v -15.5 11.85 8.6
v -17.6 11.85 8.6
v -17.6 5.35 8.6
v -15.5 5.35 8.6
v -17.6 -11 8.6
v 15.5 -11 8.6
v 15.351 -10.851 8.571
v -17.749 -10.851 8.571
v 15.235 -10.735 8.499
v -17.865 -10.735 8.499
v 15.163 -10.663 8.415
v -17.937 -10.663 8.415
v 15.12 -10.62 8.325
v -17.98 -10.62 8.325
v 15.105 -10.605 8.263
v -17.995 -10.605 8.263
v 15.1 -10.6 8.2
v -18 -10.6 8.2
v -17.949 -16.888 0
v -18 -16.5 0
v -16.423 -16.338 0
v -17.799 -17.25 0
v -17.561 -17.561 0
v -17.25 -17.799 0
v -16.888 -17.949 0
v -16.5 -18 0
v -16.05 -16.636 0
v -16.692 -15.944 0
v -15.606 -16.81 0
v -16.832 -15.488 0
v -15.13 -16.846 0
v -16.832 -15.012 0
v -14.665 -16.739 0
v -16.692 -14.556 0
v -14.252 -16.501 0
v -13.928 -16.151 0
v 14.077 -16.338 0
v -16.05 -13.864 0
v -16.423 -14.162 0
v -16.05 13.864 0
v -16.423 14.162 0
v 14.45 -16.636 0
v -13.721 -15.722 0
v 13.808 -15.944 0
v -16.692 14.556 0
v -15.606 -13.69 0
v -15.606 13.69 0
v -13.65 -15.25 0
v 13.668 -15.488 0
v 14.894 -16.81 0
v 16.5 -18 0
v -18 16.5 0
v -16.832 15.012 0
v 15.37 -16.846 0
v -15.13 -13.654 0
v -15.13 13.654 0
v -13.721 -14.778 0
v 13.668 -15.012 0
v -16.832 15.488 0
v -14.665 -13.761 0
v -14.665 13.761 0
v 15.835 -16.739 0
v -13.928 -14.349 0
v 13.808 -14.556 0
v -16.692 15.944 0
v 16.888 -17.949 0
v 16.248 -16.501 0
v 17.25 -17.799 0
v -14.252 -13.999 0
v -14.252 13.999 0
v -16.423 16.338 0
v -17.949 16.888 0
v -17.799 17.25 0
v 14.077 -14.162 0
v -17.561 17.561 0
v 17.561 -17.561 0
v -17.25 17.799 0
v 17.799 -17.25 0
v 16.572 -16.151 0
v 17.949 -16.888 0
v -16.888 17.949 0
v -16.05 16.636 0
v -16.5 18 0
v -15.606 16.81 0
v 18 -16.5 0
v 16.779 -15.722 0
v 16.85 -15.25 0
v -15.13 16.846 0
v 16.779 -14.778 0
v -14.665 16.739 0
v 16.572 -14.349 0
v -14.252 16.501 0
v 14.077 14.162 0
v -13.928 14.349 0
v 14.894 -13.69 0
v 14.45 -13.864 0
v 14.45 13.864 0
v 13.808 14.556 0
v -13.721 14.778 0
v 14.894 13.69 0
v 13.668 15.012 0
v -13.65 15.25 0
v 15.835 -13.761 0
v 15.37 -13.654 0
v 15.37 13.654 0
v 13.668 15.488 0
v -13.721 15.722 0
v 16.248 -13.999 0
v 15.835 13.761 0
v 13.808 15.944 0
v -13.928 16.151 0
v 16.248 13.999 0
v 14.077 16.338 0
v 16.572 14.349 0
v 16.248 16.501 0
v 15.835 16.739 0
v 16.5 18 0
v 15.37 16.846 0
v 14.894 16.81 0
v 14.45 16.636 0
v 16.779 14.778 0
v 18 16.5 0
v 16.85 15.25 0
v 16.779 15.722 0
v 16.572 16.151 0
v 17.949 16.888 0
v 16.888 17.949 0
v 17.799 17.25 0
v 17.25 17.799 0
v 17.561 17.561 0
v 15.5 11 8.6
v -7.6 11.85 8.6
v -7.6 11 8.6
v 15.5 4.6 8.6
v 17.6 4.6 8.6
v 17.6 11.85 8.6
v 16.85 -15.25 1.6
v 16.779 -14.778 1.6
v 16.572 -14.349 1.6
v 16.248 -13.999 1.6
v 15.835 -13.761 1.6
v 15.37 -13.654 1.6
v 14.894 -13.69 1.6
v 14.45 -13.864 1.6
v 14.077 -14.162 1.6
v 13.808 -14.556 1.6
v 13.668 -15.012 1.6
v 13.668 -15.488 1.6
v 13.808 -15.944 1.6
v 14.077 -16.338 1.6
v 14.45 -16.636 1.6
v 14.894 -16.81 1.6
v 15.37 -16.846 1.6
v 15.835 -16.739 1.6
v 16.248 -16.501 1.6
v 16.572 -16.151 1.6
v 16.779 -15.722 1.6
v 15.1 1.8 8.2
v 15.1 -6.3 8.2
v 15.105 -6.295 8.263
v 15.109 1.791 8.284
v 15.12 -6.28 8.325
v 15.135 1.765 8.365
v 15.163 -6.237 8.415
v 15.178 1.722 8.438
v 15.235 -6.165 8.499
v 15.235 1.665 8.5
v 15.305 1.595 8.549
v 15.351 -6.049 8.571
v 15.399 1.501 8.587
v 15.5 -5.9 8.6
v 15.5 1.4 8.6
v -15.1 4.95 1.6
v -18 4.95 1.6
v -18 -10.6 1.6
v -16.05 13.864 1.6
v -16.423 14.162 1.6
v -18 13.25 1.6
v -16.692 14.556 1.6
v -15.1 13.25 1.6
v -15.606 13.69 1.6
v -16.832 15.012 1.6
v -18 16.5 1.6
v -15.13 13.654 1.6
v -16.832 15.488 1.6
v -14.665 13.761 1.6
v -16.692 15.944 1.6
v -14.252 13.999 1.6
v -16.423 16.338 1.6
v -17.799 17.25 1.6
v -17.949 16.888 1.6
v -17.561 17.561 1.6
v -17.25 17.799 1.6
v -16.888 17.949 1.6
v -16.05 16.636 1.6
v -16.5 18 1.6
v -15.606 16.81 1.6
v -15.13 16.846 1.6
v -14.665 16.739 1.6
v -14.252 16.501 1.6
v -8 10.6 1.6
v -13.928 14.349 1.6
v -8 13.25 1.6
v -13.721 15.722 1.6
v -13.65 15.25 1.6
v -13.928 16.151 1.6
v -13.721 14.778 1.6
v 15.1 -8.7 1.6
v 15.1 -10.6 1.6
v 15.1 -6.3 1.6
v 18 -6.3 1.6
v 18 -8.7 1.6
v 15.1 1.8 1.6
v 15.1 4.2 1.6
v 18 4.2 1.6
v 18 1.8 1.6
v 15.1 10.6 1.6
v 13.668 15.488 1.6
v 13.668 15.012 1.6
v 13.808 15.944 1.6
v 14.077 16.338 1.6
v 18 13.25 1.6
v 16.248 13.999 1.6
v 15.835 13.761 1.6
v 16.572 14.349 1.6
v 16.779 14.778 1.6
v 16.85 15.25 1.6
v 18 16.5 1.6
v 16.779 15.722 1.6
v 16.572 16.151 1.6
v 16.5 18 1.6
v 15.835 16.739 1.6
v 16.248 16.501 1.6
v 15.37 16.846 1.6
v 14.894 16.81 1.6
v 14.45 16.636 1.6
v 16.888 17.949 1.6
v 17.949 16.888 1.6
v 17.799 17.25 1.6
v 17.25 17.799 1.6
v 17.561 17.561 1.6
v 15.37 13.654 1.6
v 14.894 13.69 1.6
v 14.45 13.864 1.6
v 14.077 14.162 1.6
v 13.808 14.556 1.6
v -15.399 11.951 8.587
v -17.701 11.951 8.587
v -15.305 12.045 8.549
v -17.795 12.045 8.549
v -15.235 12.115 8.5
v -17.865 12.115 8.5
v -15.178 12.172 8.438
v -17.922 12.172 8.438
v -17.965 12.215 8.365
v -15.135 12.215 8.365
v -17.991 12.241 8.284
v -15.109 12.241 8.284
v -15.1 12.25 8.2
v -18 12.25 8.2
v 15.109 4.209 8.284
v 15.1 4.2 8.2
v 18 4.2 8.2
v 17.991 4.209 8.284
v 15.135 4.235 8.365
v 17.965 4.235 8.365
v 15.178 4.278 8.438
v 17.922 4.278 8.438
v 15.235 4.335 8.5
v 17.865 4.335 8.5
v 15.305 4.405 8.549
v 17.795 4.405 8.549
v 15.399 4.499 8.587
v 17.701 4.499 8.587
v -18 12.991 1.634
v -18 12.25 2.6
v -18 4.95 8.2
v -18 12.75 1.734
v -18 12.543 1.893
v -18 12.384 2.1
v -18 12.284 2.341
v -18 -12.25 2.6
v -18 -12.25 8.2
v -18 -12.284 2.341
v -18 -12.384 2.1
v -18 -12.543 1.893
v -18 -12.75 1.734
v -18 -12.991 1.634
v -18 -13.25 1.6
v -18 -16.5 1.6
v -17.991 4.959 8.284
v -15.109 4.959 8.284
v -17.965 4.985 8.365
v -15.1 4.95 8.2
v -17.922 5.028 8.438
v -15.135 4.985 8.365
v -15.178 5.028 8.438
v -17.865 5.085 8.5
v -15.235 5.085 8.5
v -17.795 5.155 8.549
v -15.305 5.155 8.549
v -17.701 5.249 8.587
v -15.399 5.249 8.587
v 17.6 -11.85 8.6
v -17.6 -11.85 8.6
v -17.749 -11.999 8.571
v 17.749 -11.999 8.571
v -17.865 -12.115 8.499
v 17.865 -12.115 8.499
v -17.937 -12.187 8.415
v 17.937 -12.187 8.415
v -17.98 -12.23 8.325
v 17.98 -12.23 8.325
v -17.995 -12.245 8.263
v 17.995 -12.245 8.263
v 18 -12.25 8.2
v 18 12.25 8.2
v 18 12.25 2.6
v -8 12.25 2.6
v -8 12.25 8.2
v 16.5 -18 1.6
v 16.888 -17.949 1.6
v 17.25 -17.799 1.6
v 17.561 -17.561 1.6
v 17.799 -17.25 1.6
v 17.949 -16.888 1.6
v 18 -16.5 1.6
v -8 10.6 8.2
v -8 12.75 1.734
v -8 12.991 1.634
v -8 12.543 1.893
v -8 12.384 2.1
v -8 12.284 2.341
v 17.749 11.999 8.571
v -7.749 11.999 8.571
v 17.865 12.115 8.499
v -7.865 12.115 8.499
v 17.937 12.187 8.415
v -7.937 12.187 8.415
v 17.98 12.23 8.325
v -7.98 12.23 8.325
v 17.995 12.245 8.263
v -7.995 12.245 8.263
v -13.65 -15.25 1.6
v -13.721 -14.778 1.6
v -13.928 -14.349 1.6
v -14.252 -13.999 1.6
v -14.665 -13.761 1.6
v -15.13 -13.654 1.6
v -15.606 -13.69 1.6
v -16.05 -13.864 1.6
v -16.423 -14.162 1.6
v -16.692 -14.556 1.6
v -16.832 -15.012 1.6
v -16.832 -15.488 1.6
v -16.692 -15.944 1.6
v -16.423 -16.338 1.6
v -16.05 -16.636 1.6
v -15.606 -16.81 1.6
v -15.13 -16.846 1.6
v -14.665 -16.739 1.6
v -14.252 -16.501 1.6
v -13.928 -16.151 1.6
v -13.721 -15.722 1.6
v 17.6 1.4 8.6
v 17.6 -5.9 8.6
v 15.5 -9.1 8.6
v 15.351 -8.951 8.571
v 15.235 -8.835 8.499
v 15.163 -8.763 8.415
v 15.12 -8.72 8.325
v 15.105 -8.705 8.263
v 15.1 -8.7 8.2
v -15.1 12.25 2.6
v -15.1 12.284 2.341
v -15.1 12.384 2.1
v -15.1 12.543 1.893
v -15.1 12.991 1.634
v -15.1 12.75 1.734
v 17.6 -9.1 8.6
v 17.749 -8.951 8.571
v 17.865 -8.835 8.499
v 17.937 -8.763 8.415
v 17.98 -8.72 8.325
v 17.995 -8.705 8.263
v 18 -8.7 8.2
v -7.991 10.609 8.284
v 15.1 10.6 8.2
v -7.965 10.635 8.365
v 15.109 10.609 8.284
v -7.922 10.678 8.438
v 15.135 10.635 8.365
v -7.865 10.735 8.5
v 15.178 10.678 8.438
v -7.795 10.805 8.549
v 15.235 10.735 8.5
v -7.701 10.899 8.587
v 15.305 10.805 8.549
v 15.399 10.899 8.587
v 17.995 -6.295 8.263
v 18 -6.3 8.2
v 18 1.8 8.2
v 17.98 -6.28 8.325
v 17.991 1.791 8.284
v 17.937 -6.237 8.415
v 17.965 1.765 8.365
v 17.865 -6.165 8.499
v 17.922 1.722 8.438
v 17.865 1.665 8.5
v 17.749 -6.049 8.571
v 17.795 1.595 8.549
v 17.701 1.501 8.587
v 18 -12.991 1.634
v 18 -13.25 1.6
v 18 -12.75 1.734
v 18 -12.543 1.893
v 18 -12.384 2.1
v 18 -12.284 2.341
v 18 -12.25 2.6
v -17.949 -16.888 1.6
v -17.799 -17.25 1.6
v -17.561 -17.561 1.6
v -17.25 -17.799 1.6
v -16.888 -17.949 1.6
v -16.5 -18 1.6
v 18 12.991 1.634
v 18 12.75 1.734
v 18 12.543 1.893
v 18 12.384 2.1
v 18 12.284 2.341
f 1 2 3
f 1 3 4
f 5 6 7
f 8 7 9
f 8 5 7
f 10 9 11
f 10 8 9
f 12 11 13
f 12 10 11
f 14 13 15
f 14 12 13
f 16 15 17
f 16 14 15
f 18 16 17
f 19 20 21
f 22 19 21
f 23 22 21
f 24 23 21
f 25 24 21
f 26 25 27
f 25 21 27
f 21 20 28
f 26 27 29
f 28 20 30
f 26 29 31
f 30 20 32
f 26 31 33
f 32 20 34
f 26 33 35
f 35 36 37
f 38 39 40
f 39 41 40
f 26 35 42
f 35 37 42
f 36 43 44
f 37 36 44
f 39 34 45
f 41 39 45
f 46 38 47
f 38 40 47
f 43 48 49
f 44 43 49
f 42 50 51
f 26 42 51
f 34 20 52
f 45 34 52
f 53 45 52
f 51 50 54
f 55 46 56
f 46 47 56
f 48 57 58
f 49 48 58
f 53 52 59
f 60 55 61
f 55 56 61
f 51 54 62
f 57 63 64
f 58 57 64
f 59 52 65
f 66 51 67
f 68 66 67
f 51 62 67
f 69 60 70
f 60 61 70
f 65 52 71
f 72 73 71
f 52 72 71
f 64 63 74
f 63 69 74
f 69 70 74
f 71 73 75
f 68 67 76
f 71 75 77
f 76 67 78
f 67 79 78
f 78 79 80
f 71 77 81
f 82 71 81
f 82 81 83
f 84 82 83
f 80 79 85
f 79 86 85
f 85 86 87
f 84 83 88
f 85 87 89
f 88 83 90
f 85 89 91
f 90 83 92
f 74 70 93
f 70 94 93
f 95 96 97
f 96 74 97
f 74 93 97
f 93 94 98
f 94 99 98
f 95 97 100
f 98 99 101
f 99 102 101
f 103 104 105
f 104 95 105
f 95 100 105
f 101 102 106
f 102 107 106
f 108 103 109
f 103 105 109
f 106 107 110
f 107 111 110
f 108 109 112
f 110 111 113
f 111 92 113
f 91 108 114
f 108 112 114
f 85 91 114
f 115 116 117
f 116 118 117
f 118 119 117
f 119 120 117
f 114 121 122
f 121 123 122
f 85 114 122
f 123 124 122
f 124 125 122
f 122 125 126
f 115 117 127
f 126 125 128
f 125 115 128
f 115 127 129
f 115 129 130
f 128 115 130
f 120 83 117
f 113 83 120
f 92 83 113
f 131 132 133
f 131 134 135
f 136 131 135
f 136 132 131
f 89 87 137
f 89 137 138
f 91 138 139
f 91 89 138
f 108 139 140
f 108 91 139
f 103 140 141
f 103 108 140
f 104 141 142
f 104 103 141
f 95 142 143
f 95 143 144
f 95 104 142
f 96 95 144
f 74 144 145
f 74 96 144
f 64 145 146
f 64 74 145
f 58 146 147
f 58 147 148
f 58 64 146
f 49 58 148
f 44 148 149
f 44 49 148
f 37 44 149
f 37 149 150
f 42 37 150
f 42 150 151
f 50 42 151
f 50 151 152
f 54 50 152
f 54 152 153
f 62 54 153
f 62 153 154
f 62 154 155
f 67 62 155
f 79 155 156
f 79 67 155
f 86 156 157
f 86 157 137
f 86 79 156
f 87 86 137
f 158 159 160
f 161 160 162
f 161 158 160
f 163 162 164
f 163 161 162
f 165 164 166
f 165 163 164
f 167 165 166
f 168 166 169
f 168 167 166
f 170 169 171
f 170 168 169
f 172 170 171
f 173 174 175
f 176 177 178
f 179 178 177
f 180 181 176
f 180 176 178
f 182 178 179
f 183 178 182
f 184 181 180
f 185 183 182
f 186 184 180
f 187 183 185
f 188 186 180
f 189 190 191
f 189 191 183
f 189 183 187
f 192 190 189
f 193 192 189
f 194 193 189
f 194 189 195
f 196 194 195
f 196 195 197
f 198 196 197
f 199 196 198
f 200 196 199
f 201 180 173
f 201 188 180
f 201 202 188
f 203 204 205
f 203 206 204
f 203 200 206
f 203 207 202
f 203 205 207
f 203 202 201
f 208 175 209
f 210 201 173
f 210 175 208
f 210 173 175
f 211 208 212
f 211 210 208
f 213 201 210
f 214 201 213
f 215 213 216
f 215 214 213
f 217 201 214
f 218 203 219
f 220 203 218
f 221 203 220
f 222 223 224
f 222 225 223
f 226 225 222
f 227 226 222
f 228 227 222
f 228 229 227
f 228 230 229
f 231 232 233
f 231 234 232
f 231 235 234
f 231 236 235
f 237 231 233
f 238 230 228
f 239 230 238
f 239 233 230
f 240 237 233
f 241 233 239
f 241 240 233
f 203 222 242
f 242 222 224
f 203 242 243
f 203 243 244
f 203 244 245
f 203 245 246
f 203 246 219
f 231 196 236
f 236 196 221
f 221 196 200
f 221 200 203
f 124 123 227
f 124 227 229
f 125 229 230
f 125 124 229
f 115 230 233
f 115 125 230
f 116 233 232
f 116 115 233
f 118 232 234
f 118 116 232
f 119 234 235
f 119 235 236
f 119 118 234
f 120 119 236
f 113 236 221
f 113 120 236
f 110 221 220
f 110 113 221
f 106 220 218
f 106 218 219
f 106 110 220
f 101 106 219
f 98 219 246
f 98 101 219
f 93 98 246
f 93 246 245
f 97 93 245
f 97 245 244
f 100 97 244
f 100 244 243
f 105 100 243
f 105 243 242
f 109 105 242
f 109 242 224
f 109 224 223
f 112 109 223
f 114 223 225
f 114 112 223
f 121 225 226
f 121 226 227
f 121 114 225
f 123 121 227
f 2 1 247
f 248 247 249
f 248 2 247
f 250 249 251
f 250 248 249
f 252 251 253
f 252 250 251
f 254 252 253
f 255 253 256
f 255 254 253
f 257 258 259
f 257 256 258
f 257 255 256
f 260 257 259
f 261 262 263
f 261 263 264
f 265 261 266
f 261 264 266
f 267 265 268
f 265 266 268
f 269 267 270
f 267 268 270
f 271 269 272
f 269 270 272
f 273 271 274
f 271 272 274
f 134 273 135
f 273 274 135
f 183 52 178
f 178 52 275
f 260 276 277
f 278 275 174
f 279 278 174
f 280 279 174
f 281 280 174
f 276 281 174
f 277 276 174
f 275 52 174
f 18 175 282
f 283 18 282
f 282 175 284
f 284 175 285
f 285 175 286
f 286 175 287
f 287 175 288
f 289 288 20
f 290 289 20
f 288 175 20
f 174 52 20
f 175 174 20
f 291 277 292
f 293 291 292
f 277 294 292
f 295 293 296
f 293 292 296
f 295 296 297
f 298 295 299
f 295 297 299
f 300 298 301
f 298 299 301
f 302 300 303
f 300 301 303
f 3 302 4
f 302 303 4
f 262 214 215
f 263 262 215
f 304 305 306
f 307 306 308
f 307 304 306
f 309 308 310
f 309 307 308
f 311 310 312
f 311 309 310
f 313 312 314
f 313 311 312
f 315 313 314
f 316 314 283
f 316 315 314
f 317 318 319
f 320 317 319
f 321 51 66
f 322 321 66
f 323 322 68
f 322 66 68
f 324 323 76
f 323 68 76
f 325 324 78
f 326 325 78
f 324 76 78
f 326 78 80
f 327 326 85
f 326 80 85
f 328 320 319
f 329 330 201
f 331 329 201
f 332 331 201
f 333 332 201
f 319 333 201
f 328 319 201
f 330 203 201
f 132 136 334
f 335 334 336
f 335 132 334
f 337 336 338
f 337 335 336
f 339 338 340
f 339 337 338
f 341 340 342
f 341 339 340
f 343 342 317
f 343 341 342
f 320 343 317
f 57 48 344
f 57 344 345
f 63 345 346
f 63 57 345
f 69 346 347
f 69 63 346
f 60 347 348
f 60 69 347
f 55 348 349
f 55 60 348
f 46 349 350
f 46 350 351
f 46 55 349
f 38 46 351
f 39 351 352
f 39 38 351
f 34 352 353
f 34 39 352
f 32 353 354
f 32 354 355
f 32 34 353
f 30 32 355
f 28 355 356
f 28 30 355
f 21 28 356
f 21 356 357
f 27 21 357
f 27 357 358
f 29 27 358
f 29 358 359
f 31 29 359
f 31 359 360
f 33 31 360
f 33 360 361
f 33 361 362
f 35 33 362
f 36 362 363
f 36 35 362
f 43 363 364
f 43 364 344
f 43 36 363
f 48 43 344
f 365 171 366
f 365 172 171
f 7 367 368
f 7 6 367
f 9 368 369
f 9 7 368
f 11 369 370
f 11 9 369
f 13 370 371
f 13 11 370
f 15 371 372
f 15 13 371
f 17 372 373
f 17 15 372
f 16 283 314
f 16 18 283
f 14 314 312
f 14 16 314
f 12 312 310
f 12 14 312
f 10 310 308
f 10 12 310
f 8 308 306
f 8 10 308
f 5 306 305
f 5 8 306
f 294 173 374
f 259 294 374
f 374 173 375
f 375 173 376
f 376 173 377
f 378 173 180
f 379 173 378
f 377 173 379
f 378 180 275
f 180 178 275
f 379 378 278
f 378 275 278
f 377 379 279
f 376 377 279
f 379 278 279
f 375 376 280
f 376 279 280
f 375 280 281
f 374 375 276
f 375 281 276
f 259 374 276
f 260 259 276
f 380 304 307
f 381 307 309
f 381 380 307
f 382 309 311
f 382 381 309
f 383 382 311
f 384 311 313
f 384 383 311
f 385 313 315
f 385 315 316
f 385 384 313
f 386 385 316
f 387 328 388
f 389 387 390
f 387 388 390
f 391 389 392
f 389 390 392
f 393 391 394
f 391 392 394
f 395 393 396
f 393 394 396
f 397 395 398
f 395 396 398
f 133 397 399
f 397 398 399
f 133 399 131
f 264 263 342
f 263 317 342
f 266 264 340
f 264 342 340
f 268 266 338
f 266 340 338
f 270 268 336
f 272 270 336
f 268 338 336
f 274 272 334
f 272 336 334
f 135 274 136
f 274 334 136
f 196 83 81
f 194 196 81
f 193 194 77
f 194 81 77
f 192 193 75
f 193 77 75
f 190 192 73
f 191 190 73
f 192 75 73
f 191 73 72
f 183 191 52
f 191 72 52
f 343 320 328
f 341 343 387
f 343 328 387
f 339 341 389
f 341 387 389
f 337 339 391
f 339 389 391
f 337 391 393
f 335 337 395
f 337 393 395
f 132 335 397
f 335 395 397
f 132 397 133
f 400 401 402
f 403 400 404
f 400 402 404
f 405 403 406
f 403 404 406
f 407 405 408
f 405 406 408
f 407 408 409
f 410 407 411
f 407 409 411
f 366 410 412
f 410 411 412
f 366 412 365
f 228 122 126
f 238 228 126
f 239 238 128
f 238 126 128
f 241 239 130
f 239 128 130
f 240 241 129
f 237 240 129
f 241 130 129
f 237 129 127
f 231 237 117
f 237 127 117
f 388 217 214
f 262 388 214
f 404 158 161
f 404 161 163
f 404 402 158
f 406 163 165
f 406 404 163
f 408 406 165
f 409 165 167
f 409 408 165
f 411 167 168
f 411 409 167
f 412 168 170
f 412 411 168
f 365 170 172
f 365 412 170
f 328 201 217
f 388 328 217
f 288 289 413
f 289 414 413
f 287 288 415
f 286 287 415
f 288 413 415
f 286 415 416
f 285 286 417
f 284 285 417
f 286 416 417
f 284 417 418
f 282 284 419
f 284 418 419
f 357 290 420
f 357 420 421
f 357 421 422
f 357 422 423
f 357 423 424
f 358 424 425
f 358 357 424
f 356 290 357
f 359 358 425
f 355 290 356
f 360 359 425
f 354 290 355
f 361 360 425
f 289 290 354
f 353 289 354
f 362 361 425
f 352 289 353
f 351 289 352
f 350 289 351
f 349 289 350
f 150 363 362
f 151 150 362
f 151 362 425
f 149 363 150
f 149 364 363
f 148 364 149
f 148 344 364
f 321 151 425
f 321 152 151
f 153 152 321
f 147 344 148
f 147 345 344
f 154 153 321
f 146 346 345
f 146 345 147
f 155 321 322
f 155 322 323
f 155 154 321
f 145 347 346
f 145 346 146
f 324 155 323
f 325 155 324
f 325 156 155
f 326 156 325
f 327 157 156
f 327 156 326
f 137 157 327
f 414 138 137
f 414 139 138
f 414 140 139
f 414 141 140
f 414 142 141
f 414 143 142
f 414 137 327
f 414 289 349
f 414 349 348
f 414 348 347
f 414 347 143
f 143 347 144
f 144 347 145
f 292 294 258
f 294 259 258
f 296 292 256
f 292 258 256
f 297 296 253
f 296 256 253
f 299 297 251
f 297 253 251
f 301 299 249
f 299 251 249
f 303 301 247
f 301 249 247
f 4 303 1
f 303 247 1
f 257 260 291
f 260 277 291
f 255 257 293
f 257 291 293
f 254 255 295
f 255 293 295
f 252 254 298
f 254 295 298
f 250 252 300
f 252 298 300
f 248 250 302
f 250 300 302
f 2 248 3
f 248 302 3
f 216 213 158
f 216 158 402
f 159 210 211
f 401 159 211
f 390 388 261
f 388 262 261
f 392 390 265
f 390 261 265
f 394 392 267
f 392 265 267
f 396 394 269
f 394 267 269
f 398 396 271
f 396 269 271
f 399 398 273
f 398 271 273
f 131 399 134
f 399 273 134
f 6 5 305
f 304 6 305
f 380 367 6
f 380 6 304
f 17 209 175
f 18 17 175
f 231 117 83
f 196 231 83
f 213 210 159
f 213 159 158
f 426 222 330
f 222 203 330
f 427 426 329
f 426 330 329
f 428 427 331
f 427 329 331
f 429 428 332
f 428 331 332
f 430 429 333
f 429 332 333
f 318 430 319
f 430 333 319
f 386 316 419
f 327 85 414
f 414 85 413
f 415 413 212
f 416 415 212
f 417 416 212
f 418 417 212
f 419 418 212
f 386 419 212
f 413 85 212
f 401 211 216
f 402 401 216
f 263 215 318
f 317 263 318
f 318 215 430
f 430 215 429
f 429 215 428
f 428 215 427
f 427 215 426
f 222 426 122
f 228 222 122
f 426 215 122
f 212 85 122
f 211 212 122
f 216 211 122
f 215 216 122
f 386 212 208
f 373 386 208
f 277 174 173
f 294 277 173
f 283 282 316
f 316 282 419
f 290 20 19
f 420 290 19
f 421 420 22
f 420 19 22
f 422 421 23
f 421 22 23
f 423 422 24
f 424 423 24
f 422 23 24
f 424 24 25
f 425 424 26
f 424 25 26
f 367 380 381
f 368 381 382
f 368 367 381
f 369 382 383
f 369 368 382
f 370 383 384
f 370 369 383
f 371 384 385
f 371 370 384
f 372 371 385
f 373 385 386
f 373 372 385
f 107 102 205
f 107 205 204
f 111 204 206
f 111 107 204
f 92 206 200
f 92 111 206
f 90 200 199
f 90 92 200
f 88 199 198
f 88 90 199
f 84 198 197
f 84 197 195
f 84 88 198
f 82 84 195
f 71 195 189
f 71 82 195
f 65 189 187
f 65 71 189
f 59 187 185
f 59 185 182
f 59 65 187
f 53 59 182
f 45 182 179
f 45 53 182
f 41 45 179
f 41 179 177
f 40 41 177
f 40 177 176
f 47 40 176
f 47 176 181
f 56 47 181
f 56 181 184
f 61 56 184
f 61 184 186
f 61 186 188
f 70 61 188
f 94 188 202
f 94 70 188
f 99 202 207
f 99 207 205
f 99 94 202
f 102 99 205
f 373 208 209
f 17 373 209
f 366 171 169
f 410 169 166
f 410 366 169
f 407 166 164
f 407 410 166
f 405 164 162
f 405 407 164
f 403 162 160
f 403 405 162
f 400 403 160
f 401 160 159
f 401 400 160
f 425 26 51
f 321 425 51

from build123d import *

# Parameters (mm, degrees)
F0_R     = 1.6
F1_DEPTH = 1.6
F2_W     = 2.9
F2_H     = 8.1
F2_H_2   = 1.65
F3_DEPTH = 7
F4_R     = 1
F5_R     = 0.4


with BuildPart() as f1:
    # F0 (on Top) → F1 (new body)
    with BuildSketch(Plane.XY):
        with BuildLine():
            ThreePointArc((-18, -16.5), (-17.5606601718, -17.5606601718), (-16.5, -18))
            Line((-16.5, -18), (16.5, -18))
            ThreePointArc((16.5, -18), (17.5606601718, -17.5606601718), (18, -16.5))
            Line((18, -16.5), (18, 16.5))
            ThreePointArc((18, 16.5), (17.5606601718, 17.5606601718), (16.5, 18))
            Line((16.5, 18), (-16.5, 18))
            ThreePointArc((-16.5, 18), (-17.5606601718, 17.5606601718), (-18, 16.5))
            Line((-18, 16.5), (-18, -16.5))
        make_face()
        with Locations((-15.25, -15.25)):
            Circle(F0_R, mode=Mode.SUBTRACT)
        with Locations((15.25, -15.25)):
            Circle(F0_R, mode=Mode.SUBTRACT)
        with Locations((-15.25, 15.25)):
            Circle(F0_R, mode=Mode.SUBTRACT)
        with Locations((15.25, 15.25)):
            Circle(F0_R, mode=Mode.SUBTRACT)
    extrude(amount=F1_DEPTH)

    # F2 (on face) → F3 (join)
    with BuildSketch(Plane.XY.offset(1.6)):
        Polygon((15.1, -10.6), (-15.1, -10.6), (-15.1, -12.25), (18, -12.25), (18, -8.7), (15.1, -8.7), align=None)
        with Locations((16.55, -2.25)):
            Rectangle(F2_W, F2_H)
        Polygon((-8, 12.25), (-8, 10.6), (15.1, 10.6), (15.1, 4.2), (18, 4.2), (18, 12.25), align=None)
        Polygon((-18, 4.95), (-15.1, 4.95), (-15.1, 10.6), (-15.1, 12.25), (-18, 12.25), align=None)
        with Locations((-16.55, -11.425)):
            Rectangle(F2_W, F2_H_2)
    extrude(amount=F3_DEPTH)

    # F4
    f4_edges = [f1.edges().sort_by_distance(p)[0] for p in [
        (0, -12.25, 1.6),
        (5, 12.25, 1.6),
        (-16.55, 12.25, 1.6),
    ]]
    fillet(f4_edges, radius=F4_R)

    # F5
    f5_edges = [f1.edges().sort_by_distance(p)[0] for p in [
        (5, 12.25, 8.6),
        (3.55, 10.6, 8.6),
        (-15.1, 8.6, 8.6),
        (-18, 8.6, 8.6),
        (-16.55, 12.25, 8.6),
        (-8, 11.425, 8.6),
        (-16.55, 4.95, 8.6),
        (-1.45, -10.6, 8.6),
        (0, -12.25, 8.6),
        (16.55, -8.7, 8.6),
        (18, -10.475, 8.6),
        (15.1, -9.65, 8.6),
        (16.55, -6.3, 8.6),
        (15.1, -2.25, 8.6),
        (18, -2.25, 8.6),
        (16.55, 1.8, 8.6),
        (16.55, 4.2, 8.6),
        (15.1, 7.4, 8.6),
        (18, 8.225, 8.6),
        (-18, -11.425, 8.6),
    ]]
    fillet(f5_edges, radius=F5_R)


solid = f1.part
